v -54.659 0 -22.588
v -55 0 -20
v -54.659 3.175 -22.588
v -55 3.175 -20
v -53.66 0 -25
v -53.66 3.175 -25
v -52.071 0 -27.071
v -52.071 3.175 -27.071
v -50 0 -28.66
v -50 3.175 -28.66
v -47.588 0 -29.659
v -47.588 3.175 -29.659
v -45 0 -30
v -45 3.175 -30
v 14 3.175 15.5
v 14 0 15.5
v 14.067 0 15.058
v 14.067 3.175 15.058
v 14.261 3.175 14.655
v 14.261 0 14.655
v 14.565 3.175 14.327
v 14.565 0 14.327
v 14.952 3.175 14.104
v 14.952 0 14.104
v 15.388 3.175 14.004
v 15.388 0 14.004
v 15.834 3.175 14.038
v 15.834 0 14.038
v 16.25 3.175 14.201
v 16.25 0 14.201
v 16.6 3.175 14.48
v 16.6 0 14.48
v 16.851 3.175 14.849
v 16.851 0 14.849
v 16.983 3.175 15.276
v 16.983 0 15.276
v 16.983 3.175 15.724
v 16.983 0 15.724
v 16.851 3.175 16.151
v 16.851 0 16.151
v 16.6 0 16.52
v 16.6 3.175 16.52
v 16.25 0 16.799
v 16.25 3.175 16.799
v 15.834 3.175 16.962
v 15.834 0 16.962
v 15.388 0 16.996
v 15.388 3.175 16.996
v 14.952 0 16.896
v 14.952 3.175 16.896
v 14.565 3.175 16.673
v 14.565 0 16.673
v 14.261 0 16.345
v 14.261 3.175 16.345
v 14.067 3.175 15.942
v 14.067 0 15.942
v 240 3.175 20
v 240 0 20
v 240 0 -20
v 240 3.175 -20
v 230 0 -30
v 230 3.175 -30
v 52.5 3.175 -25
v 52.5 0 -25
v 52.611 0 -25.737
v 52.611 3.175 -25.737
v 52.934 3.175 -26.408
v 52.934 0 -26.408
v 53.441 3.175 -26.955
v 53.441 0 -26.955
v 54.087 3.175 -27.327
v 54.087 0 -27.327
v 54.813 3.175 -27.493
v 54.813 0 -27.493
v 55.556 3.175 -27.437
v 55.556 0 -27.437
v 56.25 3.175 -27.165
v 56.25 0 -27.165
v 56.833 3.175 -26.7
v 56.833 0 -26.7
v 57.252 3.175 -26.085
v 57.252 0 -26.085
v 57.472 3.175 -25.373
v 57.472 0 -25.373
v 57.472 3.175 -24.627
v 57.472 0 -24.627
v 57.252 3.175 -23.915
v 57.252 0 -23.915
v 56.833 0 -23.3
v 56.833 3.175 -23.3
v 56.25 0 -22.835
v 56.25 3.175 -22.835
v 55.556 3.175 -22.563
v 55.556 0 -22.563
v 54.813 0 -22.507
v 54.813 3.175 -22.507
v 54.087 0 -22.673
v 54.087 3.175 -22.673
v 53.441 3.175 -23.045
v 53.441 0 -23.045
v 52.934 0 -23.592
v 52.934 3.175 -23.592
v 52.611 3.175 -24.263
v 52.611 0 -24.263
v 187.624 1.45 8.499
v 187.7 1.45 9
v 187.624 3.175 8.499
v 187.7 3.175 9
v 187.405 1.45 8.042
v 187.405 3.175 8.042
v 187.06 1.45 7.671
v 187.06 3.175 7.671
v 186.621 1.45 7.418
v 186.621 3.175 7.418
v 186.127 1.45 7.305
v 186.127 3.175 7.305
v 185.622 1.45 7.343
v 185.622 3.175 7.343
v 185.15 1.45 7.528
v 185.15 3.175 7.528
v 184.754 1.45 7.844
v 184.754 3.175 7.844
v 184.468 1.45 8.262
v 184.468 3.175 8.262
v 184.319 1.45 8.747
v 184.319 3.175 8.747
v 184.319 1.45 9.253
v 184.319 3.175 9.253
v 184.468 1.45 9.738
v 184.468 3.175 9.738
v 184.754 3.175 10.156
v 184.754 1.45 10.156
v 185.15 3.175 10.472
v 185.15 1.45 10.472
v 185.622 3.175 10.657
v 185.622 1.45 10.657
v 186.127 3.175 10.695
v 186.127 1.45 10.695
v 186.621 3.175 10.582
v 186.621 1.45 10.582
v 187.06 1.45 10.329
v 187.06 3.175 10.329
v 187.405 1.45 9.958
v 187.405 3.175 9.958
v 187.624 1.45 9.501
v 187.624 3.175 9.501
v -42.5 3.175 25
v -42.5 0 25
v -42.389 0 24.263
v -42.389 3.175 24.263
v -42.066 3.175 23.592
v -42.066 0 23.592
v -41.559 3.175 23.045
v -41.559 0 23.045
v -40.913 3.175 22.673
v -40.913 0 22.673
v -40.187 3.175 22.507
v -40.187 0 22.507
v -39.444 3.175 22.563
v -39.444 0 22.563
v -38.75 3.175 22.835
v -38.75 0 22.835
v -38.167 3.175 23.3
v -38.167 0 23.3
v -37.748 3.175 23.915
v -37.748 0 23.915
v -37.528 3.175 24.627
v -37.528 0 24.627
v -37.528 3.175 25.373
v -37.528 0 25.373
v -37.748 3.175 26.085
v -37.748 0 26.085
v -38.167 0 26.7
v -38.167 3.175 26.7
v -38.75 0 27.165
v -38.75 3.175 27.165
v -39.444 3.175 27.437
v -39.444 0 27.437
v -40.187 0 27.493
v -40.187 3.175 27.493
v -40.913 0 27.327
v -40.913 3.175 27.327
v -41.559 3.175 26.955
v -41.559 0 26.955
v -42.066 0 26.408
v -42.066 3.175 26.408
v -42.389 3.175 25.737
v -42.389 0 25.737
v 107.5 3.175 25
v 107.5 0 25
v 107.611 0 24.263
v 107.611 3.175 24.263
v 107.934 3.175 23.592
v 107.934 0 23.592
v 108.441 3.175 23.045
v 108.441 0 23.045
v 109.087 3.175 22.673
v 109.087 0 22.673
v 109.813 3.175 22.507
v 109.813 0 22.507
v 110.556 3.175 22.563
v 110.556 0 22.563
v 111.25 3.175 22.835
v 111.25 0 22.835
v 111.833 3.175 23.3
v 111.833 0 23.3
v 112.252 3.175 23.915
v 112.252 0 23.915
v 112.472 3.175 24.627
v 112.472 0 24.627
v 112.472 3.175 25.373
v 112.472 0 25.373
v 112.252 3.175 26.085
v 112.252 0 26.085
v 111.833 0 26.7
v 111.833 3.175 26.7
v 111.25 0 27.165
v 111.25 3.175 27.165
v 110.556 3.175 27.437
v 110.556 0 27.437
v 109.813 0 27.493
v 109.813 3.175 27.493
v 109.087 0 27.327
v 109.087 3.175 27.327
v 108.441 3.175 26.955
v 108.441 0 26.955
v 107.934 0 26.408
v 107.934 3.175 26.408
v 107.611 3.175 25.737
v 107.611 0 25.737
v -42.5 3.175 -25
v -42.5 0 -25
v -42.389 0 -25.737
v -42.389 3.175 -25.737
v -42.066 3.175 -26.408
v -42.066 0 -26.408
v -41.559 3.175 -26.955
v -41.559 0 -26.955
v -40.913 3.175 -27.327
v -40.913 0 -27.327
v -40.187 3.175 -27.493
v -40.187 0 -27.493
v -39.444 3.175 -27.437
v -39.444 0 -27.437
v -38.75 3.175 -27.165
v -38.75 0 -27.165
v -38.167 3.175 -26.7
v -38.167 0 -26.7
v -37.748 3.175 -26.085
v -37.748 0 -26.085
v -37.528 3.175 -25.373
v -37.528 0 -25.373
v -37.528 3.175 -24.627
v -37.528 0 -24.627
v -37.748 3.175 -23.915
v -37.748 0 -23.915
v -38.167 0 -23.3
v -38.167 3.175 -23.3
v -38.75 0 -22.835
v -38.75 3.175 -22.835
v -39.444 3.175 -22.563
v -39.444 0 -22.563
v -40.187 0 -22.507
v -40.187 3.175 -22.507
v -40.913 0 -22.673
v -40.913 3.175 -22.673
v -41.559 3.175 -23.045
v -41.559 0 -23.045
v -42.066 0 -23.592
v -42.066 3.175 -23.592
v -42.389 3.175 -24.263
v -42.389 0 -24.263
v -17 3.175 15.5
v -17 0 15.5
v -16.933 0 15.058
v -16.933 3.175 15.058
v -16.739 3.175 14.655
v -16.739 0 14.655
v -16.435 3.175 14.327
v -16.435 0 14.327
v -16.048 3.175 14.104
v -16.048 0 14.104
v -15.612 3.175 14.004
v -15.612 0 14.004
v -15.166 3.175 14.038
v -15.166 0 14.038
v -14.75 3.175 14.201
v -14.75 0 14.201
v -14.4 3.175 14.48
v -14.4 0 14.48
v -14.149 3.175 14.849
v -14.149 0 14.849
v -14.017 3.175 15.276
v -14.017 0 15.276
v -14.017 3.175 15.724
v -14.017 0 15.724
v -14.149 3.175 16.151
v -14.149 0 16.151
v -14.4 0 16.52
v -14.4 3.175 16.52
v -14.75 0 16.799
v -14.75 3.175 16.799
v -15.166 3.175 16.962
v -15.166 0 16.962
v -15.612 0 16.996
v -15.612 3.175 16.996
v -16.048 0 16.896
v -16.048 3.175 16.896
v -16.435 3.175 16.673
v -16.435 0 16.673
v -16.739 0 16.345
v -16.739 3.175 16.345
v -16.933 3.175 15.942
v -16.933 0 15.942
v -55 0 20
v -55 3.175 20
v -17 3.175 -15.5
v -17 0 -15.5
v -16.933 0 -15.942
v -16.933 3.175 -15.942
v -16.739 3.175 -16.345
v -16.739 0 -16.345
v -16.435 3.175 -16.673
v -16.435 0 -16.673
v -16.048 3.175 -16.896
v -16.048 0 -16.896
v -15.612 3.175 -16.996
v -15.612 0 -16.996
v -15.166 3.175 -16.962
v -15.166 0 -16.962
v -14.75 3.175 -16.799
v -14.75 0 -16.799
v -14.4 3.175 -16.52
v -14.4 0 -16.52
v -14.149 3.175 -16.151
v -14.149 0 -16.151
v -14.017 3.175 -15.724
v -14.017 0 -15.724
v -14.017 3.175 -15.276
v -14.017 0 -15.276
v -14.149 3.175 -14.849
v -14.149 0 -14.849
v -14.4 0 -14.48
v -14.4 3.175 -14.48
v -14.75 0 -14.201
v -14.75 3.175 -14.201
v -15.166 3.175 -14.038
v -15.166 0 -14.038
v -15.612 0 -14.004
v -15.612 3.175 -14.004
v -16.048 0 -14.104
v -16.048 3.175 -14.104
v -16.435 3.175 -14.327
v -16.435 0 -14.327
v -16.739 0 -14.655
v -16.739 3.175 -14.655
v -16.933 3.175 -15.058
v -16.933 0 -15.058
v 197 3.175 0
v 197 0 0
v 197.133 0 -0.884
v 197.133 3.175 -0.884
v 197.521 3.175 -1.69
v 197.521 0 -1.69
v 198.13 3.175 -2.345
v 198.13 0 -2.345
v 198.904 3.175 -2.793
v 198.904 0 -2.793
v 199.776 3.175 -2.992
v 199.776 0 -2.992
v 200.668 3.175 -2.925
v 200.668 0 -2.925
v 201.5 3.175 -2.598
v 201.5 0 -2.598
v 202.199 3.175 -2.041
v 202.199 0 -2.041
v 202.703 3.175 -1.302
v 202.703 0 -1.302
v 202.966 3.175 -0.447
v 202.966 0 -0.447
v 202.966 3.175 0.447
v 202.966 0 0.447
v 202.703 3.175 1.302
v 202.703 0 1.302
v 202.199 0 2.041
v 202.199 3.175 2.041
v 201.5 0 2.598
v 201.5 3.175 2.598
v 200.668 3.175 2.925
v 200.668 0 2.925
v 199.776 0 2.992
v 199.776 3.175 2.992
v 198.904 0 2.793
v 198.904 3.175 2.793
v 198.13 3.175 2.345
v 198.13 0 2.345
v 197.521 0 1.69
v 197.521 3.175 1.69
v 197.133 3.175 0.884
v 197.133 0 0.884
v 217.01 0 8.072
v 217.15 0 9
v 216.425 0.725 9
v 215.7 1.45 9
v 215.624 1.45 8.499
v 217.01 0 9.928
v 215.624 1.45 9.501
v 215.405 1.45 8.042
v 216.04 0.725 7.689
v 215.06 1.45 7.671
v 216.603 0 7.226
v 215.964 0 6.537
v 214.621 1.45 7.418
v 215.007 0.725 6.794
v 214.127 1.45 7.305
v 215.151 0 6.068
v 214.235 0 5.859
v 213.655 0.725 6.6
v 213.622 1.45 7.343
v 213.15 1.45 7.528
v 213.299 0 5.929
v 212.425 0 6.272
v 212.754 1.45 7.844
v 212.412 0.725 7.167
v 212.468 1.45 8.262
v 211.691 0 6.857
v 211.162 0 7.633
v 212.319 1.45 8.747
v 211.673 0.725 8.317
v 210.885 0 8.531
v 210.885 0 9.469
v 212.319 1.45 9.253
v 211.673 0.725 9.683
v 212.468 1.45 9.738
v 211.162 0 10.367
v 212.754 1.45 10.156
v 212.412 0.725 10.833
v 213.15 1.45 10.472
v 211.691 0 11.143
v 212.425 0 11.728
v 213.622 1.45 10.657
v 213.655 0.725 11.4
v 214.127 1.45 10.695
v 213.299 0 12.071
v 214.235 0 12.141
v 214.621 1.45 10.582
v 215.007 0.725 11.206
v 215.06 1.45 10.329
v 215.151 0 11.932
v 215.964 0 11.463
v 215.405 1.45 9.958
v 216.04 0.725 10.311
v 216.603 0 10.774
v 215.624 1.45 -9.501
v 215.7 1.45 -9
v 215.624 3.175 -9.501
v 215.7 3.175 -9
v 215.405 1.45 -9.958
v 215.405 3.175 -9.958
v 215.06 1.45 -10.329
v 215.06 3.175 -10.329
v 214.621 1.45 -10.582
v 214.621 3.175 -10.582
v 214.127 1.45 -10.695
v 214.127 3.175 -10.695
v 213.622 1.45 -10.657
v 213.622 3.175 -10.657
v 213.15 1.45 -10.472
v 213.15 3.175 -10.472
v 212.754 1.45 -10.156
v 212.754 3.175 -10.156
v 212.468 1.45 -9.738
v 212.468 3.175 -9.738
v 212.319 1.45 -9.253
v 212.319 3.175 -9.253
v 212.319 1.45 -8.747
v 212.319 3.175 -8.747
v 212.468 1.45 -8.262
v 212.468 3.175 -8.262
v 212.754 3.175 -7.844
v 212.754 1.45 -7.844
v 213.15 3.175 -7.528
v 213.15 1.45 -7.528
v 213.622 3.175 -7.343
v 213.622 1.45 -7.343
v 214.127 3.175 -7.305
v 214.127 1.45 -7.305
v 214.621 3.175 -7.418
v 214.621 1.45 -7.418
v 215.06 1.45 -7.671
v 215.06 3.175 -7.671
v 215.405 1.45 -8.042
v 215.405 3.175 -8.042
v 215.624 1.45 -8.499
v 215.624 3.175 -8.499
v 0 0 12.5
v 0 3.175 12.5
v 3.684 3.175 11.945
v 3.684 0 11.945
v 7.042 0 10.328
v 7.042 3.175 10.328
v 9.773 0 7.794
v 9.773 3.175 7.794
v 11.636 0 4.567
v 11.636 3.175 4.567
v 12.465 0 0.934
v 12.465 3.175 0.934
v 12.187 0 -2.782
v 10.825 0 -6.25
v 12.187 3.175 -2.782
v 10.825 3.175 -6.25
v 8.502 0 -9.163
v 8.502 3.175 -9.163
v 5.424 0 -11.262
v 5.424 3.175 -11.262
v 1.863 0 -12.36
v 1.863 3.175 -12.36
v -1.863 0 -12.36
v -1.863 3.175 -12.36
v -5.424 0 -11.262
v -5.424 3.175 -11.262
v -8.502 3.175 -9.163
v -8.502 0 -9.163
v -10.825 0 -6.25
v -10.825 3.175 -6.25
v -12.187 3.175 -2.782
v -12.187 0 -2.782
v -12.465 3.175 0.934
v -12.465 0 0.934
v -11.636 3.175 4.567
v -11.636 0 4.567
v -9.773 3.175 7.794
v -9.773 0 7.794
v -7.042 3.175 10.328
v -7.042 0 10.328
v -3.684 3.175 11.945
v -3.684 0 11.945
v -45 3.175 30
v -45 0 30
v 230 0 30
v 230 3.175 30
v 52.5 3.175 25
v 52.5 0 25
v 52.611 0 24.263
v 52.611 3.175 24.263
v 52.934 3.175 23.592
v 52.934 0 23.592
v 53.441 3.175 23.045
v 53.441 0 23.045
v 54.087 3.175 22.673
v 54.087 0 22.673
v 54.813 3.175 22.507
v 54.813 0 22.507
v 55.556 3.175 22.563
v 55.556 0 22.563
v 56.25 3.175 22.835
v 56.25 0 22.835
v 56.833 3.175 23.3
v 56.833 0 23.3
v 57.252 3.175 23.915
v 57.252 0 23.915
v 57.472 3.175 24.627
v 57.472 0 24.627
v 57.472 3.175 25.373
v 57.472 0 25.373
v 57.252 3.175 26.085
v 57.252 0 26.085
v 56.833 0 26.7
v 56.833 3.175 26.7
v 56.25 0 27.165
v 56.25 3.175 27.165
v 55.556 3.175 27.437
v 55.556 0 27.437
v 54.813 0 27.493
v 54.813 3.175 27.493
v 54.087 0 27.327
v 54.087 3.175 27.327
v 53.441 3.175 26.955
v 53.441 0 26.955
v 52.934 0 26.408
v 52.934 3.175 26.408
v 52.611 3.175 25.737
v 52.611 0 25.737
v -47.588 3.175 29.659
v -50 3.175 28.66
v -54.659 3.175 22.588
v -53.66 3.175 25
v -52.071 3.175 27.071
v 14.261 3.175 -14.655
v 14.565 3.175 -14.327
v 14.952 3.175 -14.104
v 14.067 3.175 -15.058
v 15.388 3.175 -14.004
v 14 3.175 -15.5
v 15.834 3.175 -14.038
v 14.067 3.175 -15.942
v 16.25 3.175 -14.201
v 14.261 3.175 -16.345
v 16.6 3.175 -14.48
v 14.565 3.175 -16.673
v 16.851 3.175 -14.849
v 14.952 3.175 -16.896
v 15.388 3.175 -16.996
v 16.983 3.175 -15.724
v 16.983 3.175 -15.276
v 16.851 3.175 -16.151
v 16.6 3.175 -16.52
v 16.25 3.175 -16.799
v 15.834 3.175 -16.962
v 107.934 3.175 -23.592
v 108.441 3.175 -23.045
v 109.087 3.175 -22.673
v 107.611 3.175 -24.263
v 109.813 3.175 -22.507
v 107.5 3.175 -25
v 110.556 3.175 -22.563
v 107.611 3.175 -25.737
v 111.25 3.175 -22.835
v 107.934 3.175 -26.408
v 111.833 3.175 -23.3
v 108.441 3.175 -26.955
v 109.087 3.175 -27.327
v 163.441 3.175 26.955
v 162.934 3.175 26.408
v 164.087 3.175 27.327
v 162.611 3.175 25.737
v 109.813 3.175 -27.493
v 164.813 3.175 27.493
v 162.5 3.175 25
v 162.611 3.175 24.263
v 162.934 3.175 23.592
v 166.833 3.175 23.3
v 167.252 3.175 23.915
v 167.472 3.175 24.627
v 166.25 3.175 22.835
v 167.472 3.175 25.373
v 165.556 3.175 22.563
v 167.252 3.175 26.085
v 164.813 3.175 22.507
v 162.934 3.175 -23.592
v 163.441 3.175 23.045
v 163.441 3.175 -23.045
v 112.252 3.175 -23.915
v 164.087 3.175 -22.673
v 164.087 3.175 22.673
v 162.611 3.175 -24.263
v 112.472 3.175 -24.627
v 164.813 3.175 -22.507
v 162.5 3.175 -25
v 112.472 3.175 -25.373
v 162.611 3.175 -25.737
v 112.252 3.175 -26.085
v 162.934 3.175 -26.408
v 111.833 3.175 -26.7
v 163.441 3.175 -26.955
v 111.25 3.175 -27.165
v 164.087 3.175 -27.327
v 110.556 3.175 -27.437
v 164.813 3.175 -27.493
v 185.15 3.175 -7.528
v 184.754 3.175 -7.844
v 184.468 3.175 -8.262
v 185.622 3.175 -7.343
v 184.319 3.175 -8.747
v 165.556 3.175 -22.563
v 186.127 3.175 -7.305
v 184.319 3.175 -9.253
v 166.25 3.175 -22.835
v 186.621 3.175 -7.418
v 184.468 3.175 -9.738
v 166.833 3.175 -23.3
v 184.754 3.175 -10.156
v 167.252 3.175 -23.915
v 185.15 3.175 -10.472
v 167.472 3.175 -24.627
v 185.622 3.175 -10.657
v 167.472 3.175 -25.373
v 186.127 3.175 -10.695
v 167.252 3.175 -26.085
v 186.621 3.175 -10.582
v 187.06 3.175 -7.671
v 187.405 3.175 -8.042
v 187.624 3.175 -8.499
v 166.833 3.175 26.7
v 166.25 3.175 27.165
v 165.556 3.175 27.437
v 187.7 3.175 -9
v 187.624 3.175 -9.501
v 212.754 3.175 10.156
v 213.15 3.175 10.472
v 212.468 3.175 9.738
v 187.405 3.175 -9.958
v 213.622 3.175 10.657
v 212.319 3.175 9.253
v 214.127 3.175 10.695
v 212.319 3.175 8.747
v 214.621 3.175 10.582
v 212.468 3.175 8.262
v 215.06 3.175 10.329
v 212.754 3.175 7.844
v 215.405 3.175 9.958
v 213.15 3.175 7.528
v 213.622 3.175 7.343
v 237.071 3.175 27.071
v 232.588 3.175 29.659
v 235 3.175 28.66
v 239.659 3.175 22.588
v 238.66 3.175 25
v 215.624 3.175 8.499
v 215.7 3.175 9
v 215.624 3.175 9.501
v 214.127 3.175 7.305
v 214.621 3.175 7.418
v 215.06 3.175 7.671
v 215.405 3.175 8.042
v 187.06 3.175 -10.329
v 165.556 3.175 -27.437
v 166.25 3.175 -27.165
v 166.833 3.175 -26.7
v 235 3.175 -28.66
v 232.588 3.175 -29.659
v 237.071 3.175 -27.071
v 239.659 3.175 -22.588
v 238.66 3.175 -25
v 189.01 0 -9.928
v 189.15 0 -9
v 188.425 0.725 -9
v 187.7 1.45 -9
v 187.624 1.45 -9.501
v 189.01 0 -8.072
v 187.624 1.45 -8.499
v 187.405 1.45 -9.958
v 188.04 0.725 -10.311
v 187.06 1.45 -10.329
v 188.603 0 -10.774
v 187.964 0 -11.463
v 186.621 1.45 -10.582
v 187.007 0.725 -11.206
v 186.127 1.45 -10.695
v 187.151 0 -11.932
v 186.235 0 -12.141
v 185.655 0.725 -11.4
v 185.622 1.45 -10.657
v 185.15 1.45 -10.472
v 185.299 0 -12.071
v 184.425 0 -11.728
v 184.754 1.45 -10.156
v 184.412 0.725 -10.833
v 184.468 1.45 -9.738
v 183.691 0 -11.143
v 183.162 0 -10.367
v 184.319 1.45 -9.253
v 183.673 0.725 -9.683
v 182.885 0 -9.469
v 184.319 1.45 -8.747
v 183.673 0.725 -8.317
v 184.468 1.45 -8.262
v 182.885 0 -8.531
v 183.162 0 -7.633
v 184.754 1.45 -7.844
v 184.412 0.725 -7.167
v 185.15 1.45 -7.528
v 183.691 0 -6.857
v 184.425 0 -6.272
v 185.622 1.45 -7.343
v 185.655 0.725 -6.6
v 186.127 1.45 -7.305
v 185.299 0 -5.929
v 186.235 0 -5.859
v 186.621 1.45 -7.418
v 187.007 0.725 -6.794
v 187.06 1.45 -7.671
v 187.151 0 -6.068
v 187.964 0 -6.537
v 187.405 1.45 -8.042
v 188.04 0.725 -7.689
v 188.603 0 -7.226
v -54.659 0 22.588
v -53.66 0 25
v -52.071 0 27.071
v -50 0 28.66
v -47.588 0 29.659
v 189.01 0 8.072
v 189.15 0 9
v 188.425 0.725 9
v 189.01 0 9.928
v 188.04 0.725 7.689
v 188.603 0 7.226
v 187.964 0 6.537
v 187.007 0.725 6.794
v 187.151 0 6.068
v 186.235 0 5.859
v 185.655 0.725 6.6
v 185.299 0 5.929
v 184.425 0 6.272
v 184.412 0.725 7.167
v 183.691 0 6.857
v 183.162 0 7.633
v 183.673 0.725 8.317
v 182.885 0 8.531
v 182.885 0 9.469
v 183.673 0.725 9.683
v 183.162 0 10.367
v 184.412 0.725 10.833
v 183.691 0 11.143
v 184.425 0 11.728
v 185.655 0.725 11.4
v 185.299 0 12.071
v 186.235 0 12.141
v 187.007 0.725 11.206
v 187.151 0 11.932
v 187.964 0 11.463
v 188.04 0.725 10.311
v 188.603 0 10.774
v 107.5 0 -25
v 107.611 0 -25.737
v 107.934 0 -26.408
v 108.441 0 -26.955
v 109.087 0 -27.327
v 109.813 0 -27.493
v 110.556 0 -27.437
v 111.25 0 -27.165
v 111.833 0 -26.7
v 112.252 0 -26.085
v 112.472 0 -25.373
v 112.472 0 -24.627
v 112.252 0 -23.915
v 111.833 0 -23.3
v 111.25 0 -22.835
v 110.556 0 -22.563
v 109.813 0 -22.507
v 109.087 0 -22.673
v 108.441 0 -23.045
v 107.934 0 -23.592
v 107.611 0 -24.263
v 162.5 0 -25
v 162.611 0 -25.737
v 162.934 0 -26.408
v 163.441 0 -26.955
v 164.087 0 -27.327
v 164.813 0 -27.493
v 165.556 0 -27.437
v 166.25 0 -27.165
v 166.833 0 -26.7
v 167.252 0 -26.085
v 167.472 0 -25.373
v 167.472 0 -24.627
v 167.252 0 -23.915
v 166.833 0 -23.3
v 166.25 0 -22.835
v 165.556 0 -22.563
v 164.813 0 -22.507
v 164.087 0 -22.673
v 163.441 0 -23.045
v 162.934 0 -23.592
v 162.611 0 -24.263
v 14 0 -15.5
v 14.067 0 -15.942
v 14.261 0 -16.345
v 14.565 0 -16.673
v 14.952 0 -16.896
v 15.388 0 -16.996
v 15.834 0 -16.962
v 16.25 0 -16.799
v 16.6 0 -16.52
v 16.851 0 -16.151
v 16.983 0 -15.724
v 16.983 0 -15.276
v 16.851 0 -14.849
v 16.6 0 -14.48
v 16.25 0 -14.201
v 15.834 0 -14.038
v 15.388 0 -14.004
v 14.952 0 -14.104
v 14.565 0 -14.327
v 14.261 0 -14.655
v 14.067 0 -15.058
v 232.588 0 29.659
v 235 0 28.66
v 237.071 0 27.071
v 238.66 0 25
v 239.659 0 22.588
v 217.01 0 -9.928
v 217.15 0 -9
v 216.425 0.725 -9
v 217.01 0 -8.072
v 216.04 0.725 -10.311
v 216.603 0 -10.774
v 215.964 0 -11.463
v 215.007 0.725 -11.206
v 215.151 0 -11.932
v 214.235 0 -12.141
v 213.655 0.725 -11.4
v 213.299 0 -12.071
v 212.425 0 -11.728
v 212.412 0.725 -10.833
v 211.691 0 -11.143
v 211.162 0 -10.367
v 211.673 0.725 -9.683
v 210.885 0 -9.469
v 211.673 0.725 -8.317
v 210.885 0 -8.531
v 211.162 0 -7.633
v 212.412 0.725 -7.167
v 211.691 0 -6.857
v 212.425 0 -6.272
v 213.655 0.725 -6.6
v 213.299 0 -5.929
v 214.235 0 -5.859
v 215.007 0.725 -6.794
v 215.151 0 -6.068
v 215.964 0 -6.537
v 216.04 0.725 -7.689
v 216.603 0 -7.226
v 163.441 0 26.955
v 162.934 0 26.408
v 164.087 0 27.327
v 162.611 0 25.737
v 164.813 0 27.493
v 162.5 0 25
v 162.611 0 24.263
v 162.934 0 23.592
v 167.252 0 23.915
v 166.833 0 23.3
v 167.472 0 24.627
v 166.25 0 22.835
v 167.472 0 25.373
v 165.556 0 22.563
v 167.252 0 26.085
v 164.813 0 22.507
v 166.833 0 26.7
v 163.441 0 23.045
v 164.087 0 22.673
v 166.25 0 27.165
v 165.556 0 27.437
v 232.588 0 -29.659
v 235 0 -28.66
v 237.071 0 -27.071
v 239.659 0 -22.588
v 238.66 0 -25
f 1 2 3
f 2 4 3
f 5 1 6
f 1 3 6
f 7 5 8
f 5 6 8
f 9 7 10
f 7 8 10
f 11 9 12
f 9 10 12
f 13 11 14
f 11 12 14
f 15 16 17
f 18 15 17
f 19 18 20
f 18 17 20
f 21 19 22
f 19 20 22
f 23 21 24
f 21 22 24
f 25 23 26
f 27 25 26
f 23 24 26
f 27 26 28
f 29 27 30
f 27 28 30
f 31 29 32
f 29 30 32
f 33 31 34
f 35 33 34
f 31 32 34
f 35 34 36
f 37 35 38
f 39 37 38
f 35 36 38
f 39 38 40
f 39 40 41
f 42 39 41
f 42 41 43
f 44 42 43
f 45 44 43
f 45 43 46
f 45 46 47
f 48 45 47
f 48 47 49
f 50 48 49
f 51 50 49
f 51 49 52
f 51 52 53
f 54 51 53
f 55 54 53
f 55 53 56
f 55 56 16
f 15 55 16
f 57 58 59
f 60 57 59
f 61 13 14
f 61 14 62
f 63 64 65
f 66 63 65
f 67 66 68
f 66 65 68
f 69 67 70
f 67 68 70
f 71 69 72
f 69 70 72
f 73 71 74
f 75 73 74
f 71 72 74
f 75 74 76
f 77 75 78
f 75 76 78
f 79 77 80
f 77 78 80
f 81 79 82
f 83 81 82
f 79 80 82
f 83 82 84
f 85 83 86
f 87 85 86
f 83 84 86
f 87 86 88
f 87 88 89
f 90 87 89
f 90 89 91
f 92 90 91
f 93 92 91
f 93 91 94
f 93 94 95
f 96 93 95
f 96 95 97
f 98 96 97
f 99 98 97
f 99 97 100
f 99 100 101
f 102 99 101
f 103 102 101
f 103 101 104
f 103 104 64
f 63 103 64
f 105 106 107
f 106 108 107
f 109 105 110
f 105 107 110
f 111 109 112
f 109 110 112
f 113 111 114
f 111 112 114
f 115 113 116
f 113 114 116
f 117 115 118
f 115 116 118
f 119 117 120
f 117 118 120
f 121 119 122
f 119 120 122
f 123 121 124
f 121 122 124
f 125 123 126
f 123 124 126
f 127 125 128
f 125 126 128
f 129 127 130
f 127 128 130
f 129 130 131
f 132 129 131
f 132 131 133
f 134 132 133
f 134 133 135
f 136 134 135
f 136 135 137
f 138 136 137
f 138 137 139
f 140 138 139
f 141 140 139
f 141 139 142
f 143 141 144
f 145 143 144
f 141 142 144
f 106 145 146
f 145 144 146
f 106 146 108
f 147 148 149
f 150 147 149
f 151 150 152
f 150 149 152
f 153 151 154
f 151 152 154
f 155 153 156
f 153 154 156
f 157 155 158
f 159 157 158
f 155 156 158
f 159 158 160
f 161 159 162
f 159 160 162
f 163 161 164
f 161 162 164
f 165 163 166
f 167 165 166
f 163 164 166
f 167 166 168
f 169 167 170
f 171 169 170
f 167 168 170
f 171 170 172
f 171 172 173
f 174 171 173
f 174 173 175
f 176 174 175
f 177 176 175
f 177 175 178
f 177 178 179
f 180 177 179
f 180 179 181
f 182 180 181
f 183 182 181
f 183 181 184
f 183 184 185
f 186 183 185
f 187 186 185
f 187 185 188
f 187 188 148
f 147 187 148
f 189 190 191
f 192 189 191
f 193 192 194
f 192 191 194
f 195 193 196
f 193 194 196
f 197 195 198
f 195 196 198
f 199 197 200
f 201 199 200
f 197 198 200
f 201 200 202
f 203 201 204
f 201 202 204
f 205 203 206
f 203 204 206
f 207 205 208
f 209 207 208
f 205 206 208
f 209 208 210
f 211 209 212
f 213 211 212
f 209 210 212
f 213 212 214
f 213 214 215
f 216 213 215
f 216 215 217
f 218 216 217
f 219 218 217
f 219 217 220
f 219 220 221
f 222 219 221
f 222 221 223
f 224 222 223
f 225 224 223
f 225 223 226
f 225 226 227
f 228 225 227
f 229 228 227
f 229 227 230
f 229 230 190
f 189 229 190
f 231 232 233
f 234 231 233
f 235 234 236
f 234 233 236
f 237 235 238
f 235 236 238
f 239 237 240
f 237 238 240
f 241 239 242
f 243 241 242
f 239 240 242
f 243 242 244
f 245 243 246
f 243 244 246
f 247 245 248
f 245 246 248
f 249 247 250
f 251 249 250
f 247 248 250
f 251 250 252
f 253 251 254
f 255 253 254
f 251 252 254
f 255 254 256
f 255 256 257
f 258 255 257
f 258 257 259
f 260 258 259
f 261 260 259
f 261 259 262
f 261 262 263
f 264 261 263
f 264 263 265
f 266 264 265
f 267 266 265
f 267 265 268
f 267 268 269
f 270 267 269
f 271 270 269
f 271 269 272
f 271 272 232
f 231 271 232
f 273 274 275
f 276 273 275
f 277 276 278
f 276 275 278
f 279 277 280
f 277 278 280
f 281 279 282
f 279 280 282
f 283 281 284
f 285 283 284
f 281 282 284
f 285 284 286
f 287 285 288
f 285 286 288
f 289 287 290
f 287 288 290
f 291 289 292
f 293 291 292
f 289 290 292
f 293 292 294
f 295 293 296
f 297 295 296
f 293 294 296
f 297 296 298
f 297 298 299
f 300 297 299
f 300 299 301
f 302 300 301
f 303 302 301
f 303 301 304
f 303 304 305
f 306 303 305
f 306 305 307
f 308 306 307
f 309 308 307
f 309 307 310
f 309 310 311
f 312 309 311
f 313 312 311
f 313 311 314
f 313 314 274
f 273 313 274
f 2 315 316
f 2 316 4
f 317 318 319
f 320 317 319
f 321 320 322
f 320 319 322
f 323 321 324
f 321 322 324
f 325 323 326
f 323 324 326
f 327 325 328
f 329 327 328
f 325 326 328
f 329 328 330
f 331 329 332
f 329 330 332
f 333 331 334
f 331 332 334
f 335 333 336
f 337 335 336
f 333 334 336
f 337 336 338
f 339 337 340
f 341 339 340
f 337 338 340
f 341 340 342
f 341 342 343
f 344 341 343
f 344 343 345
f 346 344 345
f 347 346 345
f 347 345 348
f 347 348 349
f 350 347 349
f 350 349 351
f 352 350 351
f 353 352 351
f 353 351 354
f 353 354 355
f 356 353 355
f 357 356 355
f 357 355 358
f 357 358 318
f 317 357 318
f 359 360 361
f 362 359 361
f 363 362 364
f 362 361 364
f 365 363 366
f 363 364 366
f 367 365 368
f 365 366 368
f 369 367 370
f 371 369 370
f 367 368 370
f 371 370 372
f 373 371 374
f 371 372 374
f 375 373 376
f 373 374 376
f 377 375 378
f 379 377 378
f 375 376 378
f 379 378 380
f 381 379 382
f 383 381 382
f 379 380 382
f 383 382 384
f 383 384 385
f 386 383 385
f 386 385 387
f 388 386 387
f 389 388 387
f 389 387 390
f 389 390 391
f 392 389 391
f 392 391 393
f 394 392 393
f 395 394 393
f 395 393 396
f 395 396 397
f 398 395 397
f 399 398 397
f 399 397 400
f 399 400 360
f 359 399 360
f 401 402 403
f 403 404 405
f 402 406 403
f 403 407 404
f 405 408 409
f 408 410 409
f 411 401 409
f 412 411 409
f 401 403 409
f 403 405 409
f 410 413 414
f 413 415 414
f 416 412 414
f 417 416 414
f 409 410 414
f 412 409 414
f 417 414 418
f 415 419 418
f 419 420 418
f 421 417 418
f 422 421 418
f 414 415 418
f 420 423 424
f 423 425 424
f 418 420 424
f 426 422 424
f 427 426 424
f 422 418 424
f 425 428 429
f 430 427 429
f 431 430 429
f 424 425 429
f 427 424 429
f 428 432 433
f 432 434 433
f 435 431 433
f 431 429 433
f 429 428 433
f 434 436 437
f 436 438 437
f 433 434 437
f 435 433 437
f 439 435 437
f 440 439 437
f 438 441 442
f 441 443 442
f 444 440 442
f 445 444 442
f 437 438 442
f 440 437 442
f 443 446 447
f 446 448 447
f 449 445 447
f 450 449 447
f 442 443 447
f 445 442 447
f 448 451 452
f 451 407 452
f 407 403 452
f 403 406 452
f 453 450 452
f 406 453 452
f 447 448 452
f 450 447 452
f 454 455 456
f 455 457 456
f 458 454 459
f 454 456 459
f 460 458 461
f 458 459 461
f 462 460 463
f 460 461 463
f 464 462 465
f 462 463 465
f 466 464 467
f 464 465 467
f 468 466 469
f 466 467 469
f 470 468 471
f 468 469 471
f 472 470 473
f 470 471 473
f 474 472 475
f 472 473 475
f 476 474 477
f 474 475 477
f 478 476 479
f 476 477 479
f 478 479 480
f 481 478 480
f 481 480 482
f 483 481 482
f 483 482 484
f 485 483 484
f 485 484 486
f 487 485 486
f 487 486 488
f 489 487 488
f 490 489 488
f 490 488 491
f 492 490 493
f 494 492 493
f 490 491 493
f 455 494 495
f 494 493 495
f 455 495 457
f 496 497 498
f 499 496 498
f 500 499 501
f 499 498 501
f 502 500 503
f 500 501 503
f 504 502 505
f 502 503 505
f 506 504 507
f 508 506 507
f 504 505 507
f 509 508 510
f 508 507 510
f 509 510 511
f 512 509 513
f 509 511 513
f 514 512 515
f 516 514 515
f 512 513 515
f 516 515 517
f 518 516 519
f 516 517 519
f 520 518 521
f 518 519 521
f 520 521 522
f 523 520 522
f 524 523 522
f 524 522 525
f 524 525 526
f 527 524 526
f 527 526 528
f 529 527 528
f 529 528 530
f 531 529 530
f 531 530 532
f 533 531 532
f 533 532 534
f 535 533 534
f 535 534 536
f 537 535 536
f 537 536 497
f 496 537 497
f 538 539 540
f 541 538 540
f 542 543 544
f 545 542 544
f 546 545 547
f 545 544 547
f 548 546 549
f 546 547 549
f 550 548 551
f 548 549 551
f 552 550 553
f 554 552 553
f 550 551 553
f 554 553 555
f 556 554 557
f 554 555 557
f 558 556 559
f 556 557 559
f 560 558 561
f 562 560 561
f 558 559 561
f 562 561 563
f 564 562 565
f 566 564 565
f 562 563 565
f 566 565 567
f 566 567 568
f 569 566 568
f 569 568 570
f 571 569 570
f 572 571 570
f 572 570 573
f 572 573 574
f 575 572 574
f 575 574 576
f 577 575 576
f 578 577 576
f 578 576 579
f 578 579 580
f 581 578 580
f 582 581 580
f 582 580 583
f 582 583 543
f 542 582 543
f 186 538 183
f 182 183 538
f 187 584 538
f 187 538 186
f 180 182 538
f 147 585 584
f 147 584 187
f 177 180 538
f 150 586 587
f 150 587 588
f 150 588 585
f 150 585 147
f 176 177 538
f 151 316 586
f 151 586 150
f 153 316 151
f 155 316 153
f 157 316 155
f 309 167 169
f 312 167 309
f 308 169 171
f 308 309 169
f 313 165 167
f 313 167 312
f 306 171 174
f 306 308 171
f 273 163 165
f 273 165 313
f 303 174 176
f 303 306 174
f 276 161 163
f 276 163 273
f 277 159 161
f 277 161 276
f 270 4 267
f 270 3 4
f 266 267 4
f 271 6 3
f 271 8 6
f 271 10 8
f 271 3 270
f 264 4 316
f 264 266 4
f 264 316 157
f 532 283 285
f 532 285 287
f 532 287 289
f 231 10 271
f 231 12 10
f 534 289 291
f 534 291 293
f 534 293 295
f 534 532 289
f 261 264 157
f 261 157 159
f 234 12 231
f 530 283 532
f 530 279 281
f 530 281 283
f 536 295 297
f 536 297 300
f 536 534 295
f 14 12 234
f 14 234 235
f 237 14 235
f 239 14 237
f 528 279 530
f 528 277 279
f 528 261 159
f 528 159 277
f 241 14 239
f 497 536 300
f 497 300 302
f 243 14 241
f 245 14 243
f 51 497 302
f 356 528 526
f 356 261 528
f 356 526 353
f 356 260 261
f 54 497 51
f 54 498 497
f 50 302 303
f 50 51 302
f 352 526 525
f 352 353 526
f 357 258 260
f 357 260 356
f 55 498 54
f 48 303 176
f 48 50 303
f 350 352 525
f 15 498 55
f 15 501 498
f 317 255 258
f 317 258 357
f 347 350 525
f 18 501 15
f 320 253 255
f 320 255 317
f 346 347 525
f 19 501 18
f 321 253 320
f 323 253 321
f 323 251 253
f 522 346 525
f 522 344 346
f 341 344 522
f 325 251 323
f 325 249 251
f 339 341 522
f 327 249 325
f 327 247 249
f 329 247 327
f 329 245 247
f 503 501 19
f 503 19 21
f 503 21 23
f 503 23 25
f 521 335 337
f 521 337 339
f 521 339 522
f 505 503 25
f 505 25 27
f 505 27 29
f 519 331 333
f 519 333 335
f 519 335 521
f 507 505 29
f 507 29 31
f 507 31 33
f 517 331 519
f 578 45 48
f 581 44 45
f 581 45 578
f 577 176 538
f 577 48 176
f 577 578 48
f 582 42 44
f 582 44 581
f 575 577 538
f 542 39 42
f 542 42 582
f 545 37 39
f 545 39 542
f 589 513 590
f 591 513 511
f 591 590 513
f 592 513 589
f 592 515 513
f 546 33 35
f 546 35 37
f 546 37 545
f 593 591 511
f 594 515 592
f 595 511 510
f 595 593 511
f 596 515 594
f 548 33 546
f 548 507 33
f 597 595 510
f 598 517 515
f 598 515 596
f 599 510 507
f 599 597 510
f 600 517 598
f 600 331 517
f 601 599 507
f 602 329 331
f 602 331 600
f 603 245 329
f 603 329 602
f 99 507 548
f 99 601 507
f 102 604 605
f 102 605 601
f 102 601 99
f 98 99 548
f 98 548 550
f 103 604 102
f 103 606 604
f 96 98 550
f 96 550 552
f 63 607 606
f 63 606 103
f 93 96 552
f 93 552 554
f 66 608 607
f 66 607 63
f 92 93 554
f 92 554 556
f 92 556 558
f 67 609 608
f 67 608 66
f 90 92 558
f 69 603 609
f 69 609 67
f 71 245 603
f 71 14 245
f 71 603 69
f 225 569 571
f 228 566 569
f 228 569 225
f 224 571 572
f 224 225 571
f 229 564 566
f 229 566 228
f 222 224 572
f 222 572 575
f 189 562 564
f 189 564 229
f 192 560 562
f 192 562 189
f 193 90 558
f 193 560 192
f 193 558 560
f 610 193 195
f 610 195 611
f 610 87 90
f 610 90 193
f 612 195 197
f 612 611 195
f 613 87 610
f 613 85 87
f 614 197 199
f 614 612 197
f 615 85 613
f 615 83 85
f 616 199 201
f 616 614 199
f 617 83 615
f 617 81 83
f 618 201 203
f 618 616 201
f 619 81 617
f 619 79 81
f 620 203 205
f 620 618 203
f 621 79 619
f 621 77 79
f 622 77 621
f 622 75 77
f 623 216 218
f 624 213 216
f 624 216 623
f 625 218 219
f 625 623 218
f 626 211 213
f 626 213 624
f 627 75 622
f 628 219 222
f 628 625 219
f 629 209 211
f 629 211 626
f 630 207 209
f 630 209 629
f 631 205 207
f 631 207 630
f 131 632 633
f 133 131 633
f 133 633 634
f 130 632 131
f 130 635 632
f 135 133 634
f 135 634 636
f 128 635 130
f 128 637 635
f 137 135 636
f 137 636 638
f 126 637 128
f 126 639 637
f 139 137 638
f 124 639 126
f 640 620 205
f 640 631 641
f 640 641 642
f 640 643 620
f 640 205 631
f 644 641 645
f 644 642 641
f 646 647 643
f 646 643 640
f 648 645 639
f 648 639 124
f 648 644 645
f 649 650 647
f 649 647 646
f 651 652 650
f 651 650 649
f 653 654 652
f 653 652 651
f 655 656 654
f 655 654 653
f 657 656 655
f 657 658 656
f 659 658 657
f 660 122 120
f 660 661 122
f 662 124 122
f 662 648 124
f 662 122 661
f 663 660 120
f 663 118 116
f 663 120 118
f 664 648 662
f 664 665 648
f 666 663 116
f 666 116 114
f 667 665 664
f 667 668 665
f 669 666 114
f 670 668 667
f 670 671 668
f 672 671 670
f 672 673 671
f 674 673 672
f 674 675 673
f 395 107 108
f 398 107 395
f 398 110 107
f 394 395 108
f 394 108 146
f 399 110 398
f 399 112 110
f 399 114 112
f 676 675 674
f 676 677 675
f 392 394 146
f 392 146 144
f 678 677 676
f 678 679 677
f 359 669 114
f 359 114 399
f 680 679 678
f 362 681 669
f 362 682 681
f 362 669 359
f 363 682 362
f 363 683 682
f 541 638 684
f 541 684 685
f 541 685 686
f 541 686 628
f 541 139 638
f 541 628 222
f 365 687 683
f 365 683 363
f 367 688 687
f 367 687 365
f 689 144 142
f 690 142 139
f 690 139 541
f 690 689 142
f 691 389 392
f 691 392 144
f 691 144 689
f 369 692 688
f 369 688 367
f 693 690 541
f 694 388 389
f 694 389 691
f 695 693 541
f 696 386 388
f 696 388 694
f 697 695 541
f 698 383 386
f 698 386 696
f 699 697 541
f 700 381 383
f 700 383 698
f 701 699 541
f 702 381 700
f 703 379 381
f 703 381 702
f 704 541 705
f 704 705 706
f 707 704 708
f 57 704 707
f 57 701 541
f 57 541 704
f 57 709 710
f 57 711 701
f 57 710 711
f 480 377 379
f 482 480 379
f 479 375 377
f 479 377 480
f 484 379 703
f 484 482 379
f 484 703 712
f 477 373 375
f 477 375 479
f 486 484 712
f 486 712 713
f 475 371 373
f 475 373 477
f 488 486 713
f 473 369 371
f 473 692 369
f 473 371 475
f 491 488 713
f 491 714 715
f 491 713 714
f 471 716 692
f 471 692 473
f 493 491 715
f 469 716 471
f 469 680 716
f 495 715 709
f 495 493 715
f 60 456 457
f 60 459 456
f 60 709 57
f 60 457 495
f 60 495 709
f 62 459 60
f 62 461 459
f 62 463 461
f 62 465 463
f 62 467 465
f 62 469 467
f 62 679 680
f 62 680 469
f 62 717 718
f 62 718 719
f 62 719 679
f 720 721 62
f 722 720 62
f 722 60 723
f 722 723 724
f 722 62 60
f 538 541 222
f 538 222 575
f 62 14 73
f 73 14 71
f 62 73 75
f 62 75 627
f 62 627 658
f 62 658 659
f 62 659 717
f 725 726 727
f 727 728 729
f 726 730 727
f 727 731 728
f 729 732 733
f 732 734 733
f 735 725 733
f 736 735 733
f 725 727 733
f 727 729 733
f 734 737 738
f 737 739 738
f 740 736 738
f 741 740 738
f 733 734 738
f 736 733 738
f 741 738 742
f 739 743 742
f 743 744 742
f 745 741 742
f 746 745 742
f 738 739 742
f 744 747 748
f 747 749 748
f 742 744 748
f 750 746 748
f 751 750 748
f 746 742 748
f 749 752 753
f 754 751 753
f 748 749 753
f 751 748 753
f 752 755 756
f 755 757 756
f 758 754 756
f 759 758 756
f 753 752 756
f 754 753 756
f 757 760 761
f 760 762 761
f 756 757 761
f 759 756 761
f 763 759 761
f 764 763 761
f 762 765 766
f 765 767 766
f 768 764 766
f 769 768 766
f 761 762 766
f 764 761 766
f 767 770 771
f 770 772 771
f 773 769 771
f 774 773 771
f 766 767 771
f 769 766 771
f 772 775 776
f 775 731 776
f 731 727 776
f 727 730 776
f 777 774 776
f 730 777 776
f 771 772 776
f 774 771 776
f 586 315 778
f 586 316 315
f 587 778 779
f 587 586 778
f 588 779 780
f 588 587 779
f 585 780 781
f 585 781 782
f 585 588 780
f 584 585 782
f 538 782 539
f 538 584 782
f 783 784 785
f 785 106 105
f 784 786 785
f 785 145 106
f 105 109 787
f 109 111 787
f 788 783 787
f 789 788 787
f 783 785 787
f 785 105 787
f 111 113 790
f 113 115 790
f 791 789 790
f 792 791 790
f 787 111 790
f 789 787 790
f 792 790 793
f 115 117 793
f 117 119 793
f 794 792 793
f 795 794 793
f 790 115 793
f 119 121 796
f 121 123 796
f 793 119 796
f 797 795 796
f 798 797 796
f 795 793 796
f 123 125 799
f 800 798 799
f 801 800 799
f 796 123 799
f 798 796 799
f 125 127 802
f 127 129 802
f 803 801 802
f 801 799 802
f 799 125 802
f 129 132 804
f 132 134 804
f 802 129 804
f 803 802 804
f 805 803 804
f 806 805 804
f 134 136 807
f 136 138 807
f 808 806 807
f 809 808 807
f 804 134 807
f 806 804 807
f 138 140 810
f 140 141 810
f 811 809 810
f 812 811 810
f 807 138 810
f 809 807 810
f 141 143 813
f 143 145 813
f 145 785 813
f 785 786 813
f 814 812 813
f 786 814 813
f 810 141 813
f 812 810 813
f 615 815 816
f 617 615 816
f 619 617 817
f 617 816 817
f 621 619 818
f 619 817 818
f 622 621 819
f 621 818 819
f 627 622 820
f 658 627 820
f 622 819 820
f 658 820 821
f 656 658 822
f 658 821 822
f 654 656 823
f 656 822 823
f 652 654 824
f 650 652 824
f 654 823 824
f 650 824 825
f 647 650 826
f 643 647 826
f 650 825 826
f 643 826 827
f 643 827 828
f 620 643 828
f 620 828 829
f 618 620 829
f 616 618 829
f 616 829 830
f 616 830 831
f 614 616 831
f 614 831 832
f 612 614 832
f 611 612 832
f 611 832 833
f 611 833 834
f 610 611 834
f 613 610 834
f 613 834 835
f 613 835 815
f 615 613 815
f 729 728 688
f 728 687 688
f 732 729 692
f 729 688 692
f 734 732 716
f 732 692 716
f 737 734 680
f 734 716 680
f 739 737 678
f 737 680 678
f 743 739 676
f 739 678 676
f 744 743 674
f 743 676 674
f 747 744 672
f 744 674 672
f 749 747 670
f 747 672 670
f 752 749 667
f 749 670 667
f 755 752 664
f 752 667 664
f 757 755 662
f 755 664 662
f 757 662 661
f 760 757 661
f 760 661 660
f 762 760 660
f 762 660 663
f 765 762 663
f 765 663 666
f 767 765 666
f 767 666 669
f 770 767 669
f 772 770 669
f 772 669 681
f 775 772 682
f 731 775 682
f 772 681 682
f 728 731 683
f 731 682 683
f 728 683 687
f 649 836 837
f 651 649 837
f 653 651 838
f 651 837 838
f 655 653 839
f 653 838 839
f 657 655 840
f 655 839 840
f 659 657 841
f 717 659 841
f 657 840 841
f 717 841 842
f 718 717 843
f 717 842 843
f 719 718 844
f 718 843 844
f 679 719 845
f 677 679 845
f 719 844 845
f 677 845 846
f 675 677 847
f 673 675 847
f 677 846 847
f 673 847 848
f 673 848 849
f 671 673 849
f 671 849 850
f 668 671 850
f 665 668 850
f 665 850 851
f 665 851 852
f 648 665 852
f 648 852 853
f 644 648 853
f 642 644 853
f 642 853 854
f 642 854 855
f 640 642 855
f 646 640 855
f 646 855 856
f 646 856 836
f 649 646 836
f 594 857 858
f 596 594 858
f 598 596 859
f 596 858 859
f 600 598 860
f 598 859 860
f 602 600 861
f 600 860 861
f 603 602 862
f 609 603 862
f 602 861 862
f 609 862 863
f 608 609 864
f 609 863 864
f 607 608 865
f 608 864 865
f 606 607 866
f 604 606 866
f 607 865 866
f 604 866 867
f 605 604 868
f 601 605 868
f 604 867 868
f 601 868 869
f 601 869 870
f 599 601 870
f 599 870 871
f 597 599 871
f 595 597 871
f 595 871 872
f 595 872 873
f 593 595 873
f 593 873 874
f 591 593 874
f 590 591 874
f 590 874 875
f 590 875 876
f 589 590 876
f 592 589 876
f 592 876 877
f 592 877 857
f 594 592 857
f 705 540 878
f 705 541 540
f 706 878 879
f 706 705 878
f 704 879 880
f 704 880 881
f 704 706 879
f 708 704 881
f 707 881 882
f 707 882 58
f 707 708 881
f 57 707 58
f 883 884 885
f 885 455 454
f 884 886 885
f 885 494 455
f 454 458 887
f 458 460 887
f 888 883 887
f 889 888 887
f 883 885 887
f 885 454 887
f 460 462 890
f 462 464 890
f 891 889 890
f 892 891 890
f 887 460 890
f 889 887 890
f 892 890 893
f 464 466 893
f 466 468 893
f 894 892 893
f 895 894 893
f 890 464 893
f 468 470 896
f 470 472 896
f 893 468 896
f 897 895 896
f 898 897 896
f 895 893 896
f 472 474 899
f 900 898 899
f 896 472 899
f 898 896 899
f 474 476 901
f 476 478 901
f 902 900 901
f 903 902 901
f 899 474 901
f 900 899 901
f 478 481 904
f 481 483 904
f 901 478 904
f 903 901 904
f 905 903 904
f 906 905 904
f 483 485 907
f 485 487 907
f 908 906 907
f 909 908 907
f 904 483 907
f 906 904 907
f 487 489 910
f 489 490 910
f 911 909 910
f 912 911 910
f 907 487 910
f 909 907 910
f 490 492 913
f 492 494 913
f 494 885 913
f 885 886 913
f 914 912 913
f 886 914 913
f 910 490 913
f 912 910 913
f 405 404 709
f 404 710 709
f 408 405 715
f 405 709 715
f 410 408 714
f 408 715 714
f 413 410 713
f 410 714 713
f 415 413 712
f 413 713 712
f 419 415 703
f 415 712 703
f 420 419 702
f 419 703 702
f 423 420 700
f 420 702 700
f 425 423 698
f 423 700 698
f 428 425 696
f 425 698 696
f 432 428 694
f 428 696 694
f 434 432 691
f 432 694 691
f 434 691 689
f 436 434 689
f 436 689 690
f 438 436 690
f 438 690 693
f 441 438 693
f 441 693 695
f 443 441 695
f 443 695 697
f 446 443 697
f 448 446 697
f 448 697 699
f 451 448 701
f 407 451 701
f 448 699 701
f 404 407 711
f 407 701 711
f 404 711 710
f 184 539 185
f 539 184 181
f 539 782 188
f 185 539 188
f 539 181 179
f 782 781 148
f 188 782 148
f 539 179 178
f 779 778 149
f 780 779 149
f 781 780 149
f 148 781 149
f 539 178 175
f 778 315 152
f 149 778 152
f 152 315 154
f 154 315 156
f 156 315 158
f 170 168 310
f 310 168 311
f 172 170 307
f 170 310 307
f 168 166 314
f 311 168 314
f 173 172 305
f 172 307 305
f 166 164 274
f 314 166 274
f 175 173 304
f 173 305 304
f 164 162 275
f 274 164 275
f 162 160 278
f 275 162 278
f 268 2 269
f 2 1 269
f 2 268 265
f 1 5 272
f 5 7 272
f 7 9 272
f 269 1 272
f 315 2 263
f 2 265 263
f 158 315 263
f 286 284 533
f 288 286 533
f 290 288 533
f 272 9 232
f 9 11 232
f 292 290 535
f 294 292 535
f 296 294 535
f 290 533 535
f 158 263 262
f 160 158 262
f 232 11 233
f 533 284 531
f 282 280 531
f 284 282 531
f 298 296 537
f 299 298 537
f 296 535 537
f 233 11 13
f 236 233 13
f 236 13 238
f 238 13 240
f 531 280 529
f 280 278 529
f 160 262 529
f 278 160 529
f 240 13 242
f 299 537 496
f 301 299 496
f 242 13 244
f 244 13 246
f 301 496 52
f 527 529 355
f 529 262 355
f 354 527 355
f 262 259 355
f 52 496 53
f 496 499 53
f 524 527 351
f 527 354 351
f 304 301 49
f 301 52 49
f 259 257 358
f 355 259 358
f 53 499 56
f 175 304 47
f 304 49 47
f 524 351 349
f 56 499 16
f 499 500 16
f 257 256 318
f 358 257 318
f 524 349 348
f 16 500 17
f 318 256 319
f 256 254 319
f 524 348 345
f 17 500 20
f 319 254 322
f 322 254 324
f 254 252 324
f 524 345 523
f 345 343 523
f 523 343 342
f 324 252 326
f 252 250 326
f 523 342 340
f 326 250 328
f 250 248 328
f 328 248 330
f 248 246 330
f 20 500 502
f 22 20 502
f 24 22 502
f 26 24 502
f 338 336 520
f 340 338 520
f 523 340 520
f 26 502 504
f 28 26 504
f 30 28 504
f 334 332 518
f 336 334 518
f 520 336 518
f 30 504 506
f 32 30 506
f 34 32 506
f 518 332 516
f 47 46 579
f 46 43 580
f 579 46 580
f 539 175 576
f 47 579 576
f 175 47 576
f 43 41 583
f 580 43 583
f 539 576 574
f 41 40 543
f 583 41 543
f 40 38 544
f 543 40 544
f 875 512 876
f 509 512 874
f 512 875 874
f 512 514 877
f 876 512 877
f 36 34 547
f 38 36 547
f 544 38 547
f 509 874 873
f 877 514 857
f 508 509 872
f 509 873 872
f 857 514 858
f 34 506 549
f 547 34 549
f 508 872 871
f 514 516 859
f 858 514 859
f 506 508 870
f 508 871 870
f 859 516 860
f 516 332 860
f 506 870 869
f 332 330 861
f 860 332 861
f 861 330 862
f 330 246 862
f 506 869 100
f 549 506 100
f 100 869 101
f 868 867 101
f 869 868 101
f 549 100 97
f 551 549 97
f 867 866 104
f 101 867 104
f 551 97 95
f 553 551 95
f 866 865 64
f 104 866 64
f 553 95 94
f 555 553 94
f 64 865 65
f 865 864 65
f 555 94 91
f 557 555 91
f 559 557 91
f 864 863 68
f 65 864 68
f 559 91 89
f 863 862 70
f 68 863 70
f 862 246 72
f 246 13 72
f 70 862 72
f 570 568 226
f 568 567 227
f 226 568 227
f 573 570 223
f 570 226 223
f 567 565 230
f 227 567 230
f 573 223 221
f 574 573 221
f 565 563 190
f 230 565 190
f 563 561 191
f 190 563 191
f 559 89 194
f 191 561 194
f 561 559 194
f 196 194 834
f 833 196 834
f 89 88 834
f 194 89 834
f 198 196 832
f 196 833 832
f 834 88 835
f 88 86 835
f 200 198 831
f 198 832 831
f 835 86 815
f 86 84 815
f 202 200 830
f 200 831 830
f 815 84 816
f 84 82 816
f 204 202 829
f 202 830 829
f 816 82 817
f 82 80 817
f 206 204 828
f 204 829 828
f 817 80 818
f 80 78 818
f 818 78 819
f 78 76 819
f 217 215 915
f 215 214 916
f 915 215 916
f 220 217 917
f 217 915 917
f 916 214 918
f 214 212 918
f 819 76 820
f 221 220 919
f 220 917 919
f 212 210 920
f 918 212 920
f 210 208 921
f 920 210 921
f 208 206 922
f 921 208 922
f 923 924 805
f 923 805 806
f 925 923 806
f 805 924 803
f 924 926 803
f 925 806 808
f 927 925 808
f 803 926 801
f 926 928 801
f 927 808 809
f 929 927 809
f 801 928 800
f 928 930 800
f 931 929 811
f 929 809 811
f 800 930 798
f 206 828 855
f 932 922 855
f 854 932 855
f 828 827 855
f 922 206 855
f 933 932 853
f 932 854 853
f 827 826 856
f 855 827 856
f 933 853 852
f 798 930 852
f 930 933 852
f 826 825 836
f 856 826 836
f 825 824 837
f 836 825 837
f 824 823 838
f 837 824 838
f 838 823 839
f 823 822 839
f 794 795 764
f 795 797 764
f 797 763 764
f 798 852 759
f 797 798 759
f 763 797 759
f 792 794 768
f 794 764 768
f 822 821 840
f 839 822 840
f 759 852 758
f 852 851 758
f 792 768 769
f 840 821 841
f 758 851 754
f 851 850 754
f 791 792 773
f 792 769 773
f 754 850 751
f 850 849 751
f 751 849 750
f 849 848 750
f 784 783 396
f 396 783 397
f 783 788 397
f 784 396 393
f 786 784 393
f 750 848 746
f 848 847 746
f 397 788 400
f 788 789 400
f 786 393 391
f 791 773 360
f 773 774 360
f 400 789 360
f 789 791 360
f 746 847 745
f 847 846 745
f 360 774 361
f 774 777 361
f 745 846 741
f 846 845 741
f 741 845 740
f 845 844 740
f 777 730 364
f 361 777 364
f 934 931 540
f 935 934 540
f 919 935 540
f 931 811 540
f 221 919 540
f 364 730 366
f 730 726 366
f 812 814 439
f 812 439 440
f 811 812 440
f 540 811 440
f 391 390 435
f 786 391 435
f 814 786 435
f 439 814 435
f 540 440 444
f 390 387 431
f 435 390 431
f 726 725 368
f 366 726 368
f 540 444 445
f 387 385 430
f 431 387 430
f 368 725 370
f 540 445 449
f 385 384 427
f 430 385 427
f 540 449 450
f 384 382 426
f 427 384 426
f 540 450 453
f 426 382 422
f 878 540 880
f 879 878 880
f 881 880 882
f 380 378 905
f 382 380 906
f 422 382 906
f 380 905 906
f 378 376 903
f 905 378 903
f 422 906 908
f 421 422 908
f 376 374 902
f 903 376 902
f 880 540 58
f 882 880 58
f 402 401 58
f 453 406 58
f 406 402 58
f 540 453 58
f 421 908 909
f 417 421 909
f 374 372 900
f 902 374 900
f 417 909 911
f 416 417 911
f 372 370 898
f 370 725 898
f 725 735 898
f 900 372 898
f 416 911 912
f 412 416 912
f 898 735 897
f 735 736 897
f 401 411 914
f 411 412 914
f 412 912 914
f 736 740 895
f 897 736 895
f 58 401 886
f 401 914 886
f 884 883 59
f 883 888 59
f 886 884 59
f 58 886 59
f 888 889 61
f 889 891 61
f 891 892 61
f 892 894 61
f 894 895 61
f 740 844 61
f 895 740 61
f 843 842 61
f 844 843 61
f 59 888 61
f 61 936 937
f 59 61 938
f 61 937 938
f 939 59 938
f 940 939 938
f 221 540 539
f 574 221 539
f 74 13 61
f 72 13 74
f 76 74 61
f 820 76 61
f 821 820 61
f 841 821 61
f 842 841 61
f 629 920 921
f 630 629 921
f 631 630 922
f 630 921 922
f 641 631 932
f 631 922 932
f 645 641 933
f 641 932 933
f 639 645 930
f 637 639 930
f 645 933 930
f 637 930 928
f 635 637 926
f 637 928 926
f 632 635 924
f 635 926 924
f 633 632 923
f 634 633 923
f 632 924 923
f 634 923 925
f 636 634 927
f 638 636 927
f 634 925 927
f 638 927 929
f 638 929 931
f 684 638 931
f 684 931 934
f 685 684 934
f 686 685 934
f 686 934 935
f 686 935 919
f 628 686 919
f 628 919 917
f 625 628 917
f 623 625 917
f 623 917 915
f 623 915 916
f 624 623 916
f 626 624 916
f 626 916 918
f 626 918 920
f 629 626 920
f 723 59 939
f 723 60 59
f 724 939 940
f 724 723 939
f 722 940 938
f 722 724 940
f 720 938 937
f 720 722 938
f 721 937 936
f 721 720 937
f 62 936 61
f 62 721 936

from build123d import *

# Parameters (mm, degrees)
SKETCH1_W                                       = 295
SKETCH1_H                                       = 60
BOSS_EXTRUDE1_DEPTH                             = 3.175
FILLET1_R                                       = 10
F_3_0MM_DOWEL_HOLE1_D                           = 3
SKETCH6_R                                       = 12.5
CUT_EXTRUDE1_DEPTH                              = 242.888570679
F_6_0MM_DOWEL_HOLE1_D                           = 6
CSK_FOR_M3_FLAT_HEAD_MACHINE_SCREW1_D           = 3.4
CSK_FOR_M3_FLAT_HEAD_MACHINE_SCREW1_CSINK_D     = 6.3
CSK_FOR_M3_FLAT_HEAD_MACHINE_SCREW1_CSINK_ANGLE = 90
F_5_0MM_DOWEL_HOLE1_D                           = 5


with BuildPart() as part:
    # Sketch1 → Boss-Extrude1 (new body)
    with BuildSketch(Plane(origin=(0, 0, 0), x_dir=(1, 0, 0), z_dir=(0, 1, 0))):
        with Locations((92.5, 0)):
            Rectangle(SKETCH1_W, SKETCH1_H)
    extrude(amount=BOSS_EXTRUDE1_DEPTH)

    # Fillet1
    fillet1_edges = [part.edges().sort_by_distance(p)[0] for p in [
        (-55, 1.5875, -30),
        (240, 1.5875, -30),
        (240, 1.5875, 30),
        (-55, 1.5875, 30),
    ]]
    fillet(fillet1_edges, radius=FILLET1_R)

    # Ø3.0mm Dowel Hole1 (through all)
    with Locations(Plane(origin=(0, 3.175, 0), x_dir=(1, 0, 0), z_dir=(0, 1, 0))):
        with Locations((-15.5, 15.5), (15.5, 15.5), (15.5, -15.5), (-15.5, -15.5)):
            Hole(F_3_0MM_DOWEL_HOLE1_D / 2)

    # Sketch6 → Cut-Extrude1 (cut, through all)
    with BuildSketch(Plane(origin=(0, 3.175, 0), x_dir=(1, 0, 0), z_dir=(0, 1, 0))):
        with Locations(Location((0, 0, 0), (0, 0, 270))):
            Circle(SKETCH6_R)
    extrude(amount=-CUT_EXTRUDE1_DEPTH, mode=Mode.SUBTRACT)

    # Ø6.0mm Dowel Hole1 (through all)
    with Locations(Plane(origin=(0, 3.175, 0), x_dir=(1, 0, 0), z_dir=(0, 1, 0))):
        with Locations((200, 0)):
            Hole(F_6_0MM_DOWEL_HOLE1_D / 2)

    # CSK for M3 Flat Head Machine Screw1 (through all)
    with Locations(Plane(origin=(0, 0, 0), x_dir=(-1, 0, 0), z_dir=(0, -1, 0))):
        with Locations((-214, 9), (-186, 9), (-186, -9), (-214, -9)):
            CounterSinkHole(CSK_FOR_M3_FLAT_HEAD_MACHINE_SCREW1_D / 2, CSK_FOR_M3_FLAT_HEAD_MACHINE_SCREW1_CSINK_D / 2, counter_sink_angle=CSK_FOR_M3_FLAT_HEAD_MACHINE_SCREW1_CSINK_ANGLE)

    # Ø5.0mm Dowel Hole1 (through all)
    with Locations(Plane(origin=(0, 3.175, 0), x_dir=(1, 0, 0), z_dir=(0, 1, 0))):
        with Locations((55, -25), (110, -25), (165, -25), (165, 25), (110, 25), (55, 25), (-40, -25), (-40, 25)):
            Hole(F_5_0MM_DOWEL_HOLE1_D / 2)


solid = part.part
